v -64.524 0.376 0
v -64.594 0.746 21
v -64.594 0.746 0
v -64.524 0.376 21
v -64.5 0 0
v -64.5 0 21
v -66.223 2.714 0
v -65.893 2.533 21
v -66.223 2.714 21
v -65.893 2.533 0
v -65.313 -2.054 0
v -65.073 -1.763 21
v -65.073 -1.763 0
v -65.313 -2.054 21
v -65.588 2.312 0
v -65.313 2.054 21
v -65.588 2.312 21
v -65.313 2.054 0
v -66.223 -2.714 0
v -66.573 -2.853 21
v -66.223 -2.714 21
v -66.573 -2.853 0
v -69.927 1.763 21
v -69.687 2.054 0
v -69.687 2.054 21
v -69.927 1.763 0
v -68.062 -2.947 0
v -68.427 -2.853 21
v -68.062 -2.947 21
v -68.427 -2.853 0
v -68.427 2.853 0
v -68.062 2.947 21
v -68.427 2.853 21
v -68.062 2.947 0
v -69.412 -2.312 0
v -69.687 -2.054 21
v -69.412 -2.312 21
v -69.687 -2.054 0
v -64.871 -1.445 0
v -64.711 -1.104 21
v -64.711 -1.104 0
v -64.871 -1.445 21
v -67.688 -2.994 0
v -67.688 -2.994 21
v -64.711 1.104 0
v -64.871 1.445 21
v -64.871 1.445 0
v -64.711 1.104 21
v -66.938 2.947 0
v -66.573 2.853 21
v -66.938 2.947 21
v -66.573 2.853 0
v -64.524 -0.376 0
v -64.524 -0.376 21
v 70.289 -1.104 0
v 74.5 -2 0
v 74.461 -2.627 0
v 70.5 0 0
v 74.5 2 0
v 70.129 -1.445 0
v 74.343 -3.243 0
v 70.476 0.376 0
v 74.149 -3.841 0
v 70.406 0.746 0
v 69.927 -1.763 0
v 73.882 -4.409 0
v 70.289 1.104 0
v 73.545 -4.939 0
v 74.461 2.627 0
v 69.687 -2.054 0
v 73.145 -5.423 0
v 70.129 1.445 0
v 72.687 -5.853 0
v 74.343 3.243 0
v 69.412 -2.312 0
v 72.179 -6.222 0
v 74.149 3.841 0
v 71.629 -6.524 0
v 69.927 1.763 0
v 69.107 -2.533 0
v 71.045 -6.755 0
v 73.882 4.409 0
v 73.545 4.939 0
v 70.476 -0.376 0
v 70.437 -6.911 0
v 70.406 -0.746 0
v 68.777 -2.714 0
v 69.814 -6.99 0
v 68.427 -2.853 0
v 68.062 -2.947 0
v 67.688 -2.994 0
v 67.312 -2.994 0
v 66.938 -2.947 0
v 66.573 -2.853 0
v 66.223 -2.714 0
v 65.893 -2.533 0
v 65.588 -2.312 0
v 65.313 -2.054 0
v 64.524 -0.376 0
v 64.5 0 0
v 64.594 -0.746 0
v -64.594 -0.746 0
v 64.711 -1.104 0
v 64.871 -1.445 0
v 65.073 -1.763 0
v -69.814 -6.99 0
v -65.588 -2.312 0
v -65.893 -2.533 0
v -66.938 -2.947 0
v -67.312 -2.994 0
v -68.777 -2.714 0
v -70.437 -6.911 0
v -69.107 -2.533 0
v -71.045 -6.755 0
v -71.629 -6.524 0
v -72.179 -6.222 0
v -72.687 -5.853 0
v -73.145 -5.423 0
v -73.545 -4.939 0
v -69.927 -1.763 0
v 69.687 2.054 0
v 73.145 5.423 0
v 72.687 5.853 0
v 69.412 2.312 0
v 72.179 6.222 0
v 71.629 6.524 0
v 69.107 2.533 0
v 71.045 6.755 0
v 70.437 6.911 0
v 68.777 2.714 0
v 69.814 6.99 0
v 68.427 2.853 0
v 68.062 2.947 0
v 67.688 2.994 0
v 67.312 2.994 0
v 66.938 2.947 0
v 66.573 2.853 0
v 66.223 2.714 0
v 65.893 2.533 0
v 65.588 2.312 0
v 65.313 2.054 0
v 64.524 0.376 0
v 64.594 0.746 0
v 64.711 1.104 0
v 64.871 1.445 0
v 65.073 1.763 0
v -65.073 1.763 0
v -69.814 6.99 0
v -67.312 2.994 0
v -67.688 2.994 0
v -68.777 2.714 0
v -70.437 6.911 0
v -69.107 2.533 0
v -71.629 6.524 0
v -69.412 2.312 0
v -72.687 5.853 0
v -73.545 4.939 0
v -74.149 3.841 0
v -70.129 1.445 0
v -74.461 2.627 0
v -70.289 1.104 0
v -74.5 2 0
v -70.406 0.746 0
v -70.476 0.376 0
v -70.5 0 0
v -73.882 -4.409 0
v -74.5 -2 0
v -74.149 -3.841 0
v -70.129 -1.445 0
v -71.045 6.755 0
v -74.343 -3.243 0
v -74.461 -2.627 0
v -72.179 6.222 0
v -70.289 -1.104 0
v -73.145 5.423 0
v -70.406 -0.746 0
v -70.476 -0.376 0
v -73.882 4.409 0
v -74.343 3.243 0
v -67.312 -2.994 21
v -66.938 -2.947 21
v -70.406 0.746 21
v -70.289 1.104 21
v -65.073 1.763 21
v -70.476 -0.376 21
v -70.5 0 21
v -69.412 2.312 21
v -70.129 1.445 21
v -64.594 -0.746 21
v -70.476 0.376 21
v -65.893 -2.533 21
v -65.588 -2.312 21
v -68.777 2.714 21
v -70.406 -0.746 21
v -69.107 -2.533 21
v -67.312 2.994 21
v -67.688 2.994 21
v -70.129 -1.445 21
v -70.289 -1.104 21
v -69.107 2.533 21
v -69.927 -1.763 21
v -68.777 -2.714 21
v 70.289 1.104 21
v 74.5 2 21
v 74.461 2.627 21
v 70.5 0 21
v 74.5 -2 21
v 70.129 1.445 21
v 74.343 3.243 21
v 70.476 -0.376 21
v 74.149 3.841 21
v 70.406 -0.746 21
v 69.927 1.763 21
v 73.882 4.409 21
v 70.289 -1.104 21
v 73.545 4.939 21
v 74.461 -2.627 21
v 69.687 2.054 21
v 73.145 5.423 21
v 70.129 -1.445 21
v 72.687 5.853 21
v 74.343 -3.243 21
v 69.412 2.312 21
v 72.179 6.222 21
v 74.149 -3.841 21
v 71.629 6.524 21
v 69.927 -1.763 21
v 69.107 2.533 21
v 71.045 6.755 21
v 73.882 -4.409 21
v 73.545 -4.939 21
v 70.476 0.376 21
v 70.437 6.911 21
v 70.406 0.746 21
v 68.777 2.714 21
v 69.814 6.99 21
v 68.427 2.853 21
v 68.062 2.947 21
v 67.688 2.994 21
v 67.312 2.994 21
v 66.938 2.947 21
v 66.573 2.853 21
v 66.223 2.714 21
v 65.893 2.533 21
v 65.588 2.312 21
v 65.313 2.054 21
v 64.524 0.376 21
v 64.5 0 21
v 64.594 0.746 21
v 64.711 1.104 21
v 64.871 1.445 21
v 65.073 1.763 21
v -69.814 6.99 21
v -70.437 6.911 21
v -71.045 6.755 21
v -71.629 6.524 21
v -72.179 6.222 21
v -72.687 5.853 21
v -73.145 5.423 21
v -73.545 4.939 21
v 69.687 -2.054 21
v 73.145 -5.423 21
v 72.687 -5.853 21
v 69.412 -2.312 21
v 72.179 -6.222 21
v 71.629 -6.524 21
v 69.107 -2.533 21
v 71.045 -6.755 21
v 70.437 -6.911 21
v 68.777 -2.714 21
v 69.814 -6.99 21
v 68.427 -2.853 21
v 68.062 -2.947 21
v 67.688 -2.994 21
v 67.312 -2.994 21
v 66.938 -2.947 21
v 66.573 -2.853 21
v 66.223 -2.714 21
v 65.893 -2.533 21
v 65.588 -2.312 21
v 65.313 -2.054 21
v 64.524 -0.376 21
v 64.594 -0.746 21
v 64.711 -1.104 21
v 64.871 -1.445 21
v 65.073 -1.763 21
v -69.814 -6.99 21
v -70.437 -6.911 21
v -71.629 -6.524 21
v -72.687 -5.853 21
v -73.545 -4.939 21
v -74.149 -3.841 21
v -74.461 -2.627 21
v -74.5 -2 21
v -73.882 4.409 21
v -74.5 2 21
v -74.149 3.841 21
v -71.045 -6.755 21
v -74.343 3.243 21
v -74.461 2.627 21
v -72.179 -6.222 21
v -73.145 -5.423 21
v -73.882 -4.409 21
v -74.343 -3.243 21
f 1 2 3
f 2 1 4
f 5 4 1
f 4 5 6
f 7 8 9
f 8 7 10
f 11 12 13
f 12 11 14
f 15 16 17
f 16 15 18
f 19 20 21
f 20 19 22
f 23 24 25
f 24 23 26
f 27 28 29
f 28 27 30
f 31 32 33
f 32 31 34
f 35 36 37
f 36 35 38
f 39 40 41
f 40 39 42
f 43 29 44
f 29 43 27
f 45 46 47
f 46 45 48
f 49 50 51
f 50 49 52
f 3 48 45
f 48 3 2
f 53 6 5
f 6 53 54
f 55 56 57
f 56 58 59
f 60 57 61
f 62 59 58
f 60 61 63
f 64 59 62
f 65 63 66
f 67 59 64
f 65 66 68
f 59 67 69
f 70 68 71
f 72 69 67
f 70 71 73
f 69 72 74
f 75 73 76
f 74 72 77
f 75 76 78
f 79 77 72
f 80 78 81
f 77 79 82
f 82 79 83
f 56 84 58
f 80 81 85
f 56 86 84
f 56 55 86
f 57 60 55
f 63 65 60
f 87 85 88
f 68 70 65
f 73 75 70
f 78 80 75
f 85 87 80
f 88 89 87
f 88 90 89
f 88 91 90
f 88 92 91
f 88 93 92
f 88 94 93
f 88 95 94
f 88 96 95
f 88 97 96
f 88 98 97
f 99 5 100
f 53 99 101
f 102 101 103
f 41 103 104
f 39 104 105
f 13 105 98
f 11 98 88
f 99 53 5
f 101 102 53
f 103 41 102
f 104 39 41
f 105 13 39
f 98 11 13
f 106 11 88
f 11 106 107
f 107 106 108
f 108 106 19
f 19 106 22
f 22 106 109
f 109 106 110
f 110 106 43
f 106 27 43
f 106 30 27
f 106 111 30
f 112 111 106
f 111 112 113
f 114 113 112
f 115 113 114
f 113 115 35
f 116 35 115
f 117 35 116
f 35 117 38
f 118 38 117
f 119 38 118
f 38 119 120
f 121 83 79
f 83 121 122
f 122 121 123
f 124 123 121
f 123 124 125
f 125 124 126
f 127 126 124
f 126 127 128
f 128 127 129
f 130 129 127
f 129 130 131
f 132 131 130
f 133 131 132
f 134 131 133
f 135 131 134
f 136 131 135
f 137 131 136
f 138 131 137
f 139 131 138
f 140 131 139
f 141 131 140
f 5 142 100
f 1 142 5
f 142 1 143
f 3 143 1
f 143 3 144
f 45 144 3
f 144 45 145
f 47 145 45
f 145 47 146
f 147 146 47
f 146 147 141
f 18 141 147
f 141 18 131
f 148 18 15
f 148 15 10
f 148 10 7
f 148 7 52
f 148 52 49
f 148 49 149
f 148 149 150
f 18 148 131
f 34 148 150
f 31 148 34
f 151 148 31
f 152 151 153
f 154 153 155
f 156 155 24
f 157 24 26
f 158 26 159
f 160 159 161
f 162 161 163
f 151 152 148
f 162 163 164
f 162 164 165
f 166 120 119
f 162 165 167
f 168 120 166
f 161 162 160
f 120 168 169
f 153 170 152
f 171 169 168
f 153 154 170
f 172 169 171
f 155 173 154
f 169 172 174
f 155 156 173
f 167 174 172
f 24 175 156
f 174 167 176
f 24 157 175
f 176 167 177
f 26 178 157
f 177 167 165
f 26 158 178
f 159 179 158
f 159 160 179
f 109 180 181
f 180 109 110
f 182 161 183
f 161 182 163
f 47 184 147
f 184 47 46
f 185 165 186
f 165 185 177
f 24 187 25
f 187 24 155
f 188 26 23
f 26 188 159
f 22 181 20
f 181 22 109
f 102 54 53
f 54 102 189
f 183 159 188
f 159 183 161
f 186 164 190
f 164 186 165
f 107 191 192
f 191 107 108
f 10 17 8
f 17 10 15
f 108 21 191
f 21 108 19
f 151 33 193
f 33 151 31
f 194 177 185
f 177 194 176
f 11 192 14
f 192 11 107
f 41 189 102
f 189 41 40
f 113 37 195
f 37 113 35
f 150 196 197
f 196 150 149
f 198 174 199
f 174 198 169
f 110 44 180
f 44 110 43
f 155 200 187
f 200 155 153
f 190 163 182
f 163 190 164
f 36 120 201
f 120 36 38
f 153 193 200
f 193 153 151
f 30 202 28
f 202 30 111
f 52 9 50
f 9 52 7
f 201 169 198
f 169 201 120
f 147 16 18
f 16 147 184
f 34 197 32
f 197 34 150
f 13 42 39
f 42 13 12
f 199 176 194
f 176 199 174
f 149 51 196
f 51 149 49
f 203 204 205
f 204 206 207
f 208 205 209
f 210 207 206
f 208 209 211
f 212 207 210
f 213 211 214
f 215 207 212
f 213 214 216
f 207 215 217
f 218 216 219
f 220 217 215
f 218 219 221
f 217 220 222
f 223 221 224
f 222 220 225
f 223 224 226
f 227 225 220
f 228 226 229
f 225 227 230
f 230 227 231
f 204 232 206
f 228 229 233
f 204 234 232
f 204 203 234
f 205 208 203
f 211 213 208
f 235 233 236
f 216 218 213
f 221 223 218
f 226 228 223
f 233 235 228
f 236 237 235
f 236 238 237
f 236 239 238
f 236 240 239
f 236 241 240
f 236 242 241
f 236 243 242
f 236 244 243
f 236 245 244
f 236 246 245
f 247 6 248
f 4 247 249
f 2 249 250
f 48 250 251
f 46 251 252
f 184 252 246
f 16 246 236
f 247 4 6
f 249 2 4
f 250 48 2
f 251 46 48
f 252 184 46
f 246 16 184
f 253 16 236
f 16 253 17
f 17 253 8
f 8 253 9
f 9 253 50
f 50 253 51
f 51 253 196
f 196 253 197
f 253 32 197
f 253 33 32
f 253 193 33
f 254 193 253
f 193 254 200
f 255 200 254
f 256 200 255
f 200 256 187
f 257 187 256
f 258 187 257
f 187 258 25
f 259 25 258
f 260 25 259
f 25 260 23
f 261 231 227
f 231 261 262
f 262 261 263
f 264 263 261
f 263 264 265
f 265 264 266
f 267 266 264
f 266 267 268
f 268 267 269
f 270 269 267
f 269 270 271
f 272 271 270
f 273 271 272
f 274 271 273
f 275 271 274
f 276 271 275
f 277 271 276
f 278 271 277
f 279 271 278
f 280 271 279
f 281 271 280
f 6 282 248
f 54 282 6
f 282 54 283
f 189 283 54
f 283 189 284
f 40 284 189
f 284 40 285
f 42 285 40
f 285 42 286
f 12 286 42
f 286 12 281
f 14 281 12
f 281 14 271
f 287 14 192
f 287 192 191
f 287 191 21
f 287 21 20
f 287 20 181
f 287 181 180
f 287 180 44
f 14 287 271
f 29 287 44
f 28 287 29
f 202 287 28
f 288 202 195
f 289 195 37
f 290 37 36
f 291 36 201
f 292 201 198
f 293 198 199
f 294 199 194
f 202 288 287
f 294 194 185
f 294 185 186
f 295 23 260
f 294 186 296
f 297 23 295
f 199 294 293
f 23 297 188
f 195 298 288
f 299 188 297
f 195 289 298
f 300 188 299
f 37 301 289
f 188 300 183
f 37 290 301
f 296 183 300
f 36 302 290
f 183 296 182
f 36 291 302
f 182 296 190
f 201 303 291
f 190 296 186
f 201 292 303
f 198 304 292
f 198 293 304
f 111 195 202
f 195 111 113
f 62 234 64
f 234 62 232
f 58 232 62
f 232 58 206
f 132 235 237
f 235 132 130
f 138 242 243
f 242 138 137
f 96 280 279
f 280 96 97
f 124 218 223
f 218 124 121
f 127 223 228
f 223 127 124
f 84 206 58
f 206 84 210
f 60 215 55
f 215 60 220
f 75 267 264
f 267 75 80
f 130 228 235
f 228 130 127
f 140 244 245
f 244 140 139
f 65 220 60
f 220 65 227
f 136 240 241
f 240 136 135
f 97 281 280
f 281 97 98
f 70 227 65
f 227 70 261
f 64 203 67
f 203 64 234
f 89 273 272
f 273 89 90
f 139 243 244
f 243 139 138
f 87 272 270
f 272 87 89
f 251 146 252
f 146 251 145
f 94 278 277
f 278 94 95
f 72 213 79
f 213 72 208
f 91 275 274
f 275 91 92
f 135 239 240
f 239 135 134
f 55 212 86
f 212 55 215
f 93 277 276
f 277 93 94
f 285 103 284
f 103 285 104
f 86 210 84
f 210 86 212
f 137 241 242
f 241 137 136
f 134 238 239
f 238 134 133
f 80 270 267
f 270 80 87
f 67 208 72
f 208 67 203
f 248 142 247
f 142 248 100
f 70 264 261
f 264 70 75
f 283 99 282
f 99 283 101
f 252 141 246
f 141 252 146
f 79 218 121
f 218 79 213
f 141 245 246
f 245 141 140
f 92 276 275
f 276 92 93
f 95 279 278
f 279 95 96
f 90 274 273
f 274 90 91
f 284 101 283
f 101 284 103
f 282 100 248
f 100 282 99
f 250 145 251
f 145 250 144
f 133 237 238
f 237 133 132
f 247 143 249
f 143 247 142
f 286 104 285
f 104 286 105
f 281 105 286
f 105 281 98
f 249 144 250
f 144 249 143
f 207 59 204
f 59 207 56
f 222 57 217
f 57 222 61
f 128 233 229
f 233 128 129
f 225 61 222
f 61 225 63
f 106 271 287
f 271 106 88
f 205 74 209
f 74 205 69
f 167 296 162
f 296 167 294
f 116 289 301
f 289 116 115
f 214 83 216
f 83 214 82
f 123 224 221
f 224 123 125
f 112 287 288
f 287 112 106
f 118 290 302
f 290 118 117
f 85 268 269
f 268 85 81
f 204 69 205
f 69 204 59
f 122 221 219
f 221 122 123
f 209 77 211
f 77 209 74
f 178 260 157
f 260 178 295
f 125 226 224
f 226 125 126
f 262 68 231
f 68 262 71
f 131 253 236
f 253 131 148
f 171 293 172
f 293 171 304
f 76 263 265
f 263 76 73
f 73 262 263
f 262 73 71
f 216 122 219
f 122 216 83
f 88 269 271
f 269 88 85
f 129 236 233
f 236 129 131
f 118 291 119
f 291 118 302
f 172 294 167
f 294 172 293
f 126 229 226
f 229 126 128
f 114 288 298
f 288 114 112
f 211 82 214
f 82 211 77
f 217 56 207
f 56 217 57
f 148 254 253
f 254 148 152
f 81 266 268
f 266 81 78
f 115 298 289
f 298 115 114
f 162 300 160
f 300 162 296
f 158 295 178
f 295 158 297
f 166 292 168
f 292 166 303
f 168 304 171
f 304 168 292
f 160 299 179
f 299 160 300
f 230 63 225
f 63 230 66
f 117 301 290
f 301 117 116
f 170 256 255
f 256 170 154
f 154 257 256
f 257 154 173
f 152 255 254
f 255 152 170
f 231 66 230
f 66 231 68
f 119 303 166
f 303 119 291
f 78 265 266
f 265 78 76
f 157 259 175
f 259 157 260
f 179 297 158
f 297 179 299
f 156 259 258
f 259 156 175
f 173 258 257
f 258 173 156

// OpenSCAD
$fn = 50;


difference() {
	union() {
		hull() {
			translate(v = [-69.5000000000, 2.0000000000, 0]) {
				cylinder(h = 21, r = 5);
			}
			translate(v = [69.5000000000, 2.0000000000, 0]) {
				cylinder(h = 21, r = 5);
			}
			translate(v = [-69.5000000000, -2.0000000000, 0]) {
				cylinder(h = 21, r = 5);
			}
			translate(v = [69.5000000000, -2.0000000000, 0]) {
				cylinder(h = 21, r = 5);
			}
		}
	}
	union() {
		translate(v = [-67.5000000000, 0.0000000000, 0]) {
			cylinder(h = 21, r = 3.0000000000);
		}
		translate(v = [67.5000000000, 0.0000000000, 0]) {
			cylinder(h = 21, r = 3.0000000000);
		}
		translate(v = [-67.5000000000, 0.0000000000, 0]) {
			cylinder(h = 21, r = 1.5000000000);
		}
		translate(v = [67.5000000000, 0.0000000000, 0]) {
			cylinder(h = 21, r = 1.5000000000);
		}
		translate(v = [-67.5000000000, 0.0000000000, 0]) {
			cylinder(h = 21, r = 1.5000000000);
		}
		translate(v = [67.5000000000, 0.0000000000, 0]) {
			cylinder(h = 21, r = 1.5000000000);
		}
		translate(v = [-67.5000000000, 0.0000000000, 0]) {
			cylinder(h = 21, r = 1.5000000000);
		}
		translate(v = [67.5000000000, 0.0000000000, 0]) {
			cylinder(h = 21, r = 1.5000000000);
		}
	}
}
